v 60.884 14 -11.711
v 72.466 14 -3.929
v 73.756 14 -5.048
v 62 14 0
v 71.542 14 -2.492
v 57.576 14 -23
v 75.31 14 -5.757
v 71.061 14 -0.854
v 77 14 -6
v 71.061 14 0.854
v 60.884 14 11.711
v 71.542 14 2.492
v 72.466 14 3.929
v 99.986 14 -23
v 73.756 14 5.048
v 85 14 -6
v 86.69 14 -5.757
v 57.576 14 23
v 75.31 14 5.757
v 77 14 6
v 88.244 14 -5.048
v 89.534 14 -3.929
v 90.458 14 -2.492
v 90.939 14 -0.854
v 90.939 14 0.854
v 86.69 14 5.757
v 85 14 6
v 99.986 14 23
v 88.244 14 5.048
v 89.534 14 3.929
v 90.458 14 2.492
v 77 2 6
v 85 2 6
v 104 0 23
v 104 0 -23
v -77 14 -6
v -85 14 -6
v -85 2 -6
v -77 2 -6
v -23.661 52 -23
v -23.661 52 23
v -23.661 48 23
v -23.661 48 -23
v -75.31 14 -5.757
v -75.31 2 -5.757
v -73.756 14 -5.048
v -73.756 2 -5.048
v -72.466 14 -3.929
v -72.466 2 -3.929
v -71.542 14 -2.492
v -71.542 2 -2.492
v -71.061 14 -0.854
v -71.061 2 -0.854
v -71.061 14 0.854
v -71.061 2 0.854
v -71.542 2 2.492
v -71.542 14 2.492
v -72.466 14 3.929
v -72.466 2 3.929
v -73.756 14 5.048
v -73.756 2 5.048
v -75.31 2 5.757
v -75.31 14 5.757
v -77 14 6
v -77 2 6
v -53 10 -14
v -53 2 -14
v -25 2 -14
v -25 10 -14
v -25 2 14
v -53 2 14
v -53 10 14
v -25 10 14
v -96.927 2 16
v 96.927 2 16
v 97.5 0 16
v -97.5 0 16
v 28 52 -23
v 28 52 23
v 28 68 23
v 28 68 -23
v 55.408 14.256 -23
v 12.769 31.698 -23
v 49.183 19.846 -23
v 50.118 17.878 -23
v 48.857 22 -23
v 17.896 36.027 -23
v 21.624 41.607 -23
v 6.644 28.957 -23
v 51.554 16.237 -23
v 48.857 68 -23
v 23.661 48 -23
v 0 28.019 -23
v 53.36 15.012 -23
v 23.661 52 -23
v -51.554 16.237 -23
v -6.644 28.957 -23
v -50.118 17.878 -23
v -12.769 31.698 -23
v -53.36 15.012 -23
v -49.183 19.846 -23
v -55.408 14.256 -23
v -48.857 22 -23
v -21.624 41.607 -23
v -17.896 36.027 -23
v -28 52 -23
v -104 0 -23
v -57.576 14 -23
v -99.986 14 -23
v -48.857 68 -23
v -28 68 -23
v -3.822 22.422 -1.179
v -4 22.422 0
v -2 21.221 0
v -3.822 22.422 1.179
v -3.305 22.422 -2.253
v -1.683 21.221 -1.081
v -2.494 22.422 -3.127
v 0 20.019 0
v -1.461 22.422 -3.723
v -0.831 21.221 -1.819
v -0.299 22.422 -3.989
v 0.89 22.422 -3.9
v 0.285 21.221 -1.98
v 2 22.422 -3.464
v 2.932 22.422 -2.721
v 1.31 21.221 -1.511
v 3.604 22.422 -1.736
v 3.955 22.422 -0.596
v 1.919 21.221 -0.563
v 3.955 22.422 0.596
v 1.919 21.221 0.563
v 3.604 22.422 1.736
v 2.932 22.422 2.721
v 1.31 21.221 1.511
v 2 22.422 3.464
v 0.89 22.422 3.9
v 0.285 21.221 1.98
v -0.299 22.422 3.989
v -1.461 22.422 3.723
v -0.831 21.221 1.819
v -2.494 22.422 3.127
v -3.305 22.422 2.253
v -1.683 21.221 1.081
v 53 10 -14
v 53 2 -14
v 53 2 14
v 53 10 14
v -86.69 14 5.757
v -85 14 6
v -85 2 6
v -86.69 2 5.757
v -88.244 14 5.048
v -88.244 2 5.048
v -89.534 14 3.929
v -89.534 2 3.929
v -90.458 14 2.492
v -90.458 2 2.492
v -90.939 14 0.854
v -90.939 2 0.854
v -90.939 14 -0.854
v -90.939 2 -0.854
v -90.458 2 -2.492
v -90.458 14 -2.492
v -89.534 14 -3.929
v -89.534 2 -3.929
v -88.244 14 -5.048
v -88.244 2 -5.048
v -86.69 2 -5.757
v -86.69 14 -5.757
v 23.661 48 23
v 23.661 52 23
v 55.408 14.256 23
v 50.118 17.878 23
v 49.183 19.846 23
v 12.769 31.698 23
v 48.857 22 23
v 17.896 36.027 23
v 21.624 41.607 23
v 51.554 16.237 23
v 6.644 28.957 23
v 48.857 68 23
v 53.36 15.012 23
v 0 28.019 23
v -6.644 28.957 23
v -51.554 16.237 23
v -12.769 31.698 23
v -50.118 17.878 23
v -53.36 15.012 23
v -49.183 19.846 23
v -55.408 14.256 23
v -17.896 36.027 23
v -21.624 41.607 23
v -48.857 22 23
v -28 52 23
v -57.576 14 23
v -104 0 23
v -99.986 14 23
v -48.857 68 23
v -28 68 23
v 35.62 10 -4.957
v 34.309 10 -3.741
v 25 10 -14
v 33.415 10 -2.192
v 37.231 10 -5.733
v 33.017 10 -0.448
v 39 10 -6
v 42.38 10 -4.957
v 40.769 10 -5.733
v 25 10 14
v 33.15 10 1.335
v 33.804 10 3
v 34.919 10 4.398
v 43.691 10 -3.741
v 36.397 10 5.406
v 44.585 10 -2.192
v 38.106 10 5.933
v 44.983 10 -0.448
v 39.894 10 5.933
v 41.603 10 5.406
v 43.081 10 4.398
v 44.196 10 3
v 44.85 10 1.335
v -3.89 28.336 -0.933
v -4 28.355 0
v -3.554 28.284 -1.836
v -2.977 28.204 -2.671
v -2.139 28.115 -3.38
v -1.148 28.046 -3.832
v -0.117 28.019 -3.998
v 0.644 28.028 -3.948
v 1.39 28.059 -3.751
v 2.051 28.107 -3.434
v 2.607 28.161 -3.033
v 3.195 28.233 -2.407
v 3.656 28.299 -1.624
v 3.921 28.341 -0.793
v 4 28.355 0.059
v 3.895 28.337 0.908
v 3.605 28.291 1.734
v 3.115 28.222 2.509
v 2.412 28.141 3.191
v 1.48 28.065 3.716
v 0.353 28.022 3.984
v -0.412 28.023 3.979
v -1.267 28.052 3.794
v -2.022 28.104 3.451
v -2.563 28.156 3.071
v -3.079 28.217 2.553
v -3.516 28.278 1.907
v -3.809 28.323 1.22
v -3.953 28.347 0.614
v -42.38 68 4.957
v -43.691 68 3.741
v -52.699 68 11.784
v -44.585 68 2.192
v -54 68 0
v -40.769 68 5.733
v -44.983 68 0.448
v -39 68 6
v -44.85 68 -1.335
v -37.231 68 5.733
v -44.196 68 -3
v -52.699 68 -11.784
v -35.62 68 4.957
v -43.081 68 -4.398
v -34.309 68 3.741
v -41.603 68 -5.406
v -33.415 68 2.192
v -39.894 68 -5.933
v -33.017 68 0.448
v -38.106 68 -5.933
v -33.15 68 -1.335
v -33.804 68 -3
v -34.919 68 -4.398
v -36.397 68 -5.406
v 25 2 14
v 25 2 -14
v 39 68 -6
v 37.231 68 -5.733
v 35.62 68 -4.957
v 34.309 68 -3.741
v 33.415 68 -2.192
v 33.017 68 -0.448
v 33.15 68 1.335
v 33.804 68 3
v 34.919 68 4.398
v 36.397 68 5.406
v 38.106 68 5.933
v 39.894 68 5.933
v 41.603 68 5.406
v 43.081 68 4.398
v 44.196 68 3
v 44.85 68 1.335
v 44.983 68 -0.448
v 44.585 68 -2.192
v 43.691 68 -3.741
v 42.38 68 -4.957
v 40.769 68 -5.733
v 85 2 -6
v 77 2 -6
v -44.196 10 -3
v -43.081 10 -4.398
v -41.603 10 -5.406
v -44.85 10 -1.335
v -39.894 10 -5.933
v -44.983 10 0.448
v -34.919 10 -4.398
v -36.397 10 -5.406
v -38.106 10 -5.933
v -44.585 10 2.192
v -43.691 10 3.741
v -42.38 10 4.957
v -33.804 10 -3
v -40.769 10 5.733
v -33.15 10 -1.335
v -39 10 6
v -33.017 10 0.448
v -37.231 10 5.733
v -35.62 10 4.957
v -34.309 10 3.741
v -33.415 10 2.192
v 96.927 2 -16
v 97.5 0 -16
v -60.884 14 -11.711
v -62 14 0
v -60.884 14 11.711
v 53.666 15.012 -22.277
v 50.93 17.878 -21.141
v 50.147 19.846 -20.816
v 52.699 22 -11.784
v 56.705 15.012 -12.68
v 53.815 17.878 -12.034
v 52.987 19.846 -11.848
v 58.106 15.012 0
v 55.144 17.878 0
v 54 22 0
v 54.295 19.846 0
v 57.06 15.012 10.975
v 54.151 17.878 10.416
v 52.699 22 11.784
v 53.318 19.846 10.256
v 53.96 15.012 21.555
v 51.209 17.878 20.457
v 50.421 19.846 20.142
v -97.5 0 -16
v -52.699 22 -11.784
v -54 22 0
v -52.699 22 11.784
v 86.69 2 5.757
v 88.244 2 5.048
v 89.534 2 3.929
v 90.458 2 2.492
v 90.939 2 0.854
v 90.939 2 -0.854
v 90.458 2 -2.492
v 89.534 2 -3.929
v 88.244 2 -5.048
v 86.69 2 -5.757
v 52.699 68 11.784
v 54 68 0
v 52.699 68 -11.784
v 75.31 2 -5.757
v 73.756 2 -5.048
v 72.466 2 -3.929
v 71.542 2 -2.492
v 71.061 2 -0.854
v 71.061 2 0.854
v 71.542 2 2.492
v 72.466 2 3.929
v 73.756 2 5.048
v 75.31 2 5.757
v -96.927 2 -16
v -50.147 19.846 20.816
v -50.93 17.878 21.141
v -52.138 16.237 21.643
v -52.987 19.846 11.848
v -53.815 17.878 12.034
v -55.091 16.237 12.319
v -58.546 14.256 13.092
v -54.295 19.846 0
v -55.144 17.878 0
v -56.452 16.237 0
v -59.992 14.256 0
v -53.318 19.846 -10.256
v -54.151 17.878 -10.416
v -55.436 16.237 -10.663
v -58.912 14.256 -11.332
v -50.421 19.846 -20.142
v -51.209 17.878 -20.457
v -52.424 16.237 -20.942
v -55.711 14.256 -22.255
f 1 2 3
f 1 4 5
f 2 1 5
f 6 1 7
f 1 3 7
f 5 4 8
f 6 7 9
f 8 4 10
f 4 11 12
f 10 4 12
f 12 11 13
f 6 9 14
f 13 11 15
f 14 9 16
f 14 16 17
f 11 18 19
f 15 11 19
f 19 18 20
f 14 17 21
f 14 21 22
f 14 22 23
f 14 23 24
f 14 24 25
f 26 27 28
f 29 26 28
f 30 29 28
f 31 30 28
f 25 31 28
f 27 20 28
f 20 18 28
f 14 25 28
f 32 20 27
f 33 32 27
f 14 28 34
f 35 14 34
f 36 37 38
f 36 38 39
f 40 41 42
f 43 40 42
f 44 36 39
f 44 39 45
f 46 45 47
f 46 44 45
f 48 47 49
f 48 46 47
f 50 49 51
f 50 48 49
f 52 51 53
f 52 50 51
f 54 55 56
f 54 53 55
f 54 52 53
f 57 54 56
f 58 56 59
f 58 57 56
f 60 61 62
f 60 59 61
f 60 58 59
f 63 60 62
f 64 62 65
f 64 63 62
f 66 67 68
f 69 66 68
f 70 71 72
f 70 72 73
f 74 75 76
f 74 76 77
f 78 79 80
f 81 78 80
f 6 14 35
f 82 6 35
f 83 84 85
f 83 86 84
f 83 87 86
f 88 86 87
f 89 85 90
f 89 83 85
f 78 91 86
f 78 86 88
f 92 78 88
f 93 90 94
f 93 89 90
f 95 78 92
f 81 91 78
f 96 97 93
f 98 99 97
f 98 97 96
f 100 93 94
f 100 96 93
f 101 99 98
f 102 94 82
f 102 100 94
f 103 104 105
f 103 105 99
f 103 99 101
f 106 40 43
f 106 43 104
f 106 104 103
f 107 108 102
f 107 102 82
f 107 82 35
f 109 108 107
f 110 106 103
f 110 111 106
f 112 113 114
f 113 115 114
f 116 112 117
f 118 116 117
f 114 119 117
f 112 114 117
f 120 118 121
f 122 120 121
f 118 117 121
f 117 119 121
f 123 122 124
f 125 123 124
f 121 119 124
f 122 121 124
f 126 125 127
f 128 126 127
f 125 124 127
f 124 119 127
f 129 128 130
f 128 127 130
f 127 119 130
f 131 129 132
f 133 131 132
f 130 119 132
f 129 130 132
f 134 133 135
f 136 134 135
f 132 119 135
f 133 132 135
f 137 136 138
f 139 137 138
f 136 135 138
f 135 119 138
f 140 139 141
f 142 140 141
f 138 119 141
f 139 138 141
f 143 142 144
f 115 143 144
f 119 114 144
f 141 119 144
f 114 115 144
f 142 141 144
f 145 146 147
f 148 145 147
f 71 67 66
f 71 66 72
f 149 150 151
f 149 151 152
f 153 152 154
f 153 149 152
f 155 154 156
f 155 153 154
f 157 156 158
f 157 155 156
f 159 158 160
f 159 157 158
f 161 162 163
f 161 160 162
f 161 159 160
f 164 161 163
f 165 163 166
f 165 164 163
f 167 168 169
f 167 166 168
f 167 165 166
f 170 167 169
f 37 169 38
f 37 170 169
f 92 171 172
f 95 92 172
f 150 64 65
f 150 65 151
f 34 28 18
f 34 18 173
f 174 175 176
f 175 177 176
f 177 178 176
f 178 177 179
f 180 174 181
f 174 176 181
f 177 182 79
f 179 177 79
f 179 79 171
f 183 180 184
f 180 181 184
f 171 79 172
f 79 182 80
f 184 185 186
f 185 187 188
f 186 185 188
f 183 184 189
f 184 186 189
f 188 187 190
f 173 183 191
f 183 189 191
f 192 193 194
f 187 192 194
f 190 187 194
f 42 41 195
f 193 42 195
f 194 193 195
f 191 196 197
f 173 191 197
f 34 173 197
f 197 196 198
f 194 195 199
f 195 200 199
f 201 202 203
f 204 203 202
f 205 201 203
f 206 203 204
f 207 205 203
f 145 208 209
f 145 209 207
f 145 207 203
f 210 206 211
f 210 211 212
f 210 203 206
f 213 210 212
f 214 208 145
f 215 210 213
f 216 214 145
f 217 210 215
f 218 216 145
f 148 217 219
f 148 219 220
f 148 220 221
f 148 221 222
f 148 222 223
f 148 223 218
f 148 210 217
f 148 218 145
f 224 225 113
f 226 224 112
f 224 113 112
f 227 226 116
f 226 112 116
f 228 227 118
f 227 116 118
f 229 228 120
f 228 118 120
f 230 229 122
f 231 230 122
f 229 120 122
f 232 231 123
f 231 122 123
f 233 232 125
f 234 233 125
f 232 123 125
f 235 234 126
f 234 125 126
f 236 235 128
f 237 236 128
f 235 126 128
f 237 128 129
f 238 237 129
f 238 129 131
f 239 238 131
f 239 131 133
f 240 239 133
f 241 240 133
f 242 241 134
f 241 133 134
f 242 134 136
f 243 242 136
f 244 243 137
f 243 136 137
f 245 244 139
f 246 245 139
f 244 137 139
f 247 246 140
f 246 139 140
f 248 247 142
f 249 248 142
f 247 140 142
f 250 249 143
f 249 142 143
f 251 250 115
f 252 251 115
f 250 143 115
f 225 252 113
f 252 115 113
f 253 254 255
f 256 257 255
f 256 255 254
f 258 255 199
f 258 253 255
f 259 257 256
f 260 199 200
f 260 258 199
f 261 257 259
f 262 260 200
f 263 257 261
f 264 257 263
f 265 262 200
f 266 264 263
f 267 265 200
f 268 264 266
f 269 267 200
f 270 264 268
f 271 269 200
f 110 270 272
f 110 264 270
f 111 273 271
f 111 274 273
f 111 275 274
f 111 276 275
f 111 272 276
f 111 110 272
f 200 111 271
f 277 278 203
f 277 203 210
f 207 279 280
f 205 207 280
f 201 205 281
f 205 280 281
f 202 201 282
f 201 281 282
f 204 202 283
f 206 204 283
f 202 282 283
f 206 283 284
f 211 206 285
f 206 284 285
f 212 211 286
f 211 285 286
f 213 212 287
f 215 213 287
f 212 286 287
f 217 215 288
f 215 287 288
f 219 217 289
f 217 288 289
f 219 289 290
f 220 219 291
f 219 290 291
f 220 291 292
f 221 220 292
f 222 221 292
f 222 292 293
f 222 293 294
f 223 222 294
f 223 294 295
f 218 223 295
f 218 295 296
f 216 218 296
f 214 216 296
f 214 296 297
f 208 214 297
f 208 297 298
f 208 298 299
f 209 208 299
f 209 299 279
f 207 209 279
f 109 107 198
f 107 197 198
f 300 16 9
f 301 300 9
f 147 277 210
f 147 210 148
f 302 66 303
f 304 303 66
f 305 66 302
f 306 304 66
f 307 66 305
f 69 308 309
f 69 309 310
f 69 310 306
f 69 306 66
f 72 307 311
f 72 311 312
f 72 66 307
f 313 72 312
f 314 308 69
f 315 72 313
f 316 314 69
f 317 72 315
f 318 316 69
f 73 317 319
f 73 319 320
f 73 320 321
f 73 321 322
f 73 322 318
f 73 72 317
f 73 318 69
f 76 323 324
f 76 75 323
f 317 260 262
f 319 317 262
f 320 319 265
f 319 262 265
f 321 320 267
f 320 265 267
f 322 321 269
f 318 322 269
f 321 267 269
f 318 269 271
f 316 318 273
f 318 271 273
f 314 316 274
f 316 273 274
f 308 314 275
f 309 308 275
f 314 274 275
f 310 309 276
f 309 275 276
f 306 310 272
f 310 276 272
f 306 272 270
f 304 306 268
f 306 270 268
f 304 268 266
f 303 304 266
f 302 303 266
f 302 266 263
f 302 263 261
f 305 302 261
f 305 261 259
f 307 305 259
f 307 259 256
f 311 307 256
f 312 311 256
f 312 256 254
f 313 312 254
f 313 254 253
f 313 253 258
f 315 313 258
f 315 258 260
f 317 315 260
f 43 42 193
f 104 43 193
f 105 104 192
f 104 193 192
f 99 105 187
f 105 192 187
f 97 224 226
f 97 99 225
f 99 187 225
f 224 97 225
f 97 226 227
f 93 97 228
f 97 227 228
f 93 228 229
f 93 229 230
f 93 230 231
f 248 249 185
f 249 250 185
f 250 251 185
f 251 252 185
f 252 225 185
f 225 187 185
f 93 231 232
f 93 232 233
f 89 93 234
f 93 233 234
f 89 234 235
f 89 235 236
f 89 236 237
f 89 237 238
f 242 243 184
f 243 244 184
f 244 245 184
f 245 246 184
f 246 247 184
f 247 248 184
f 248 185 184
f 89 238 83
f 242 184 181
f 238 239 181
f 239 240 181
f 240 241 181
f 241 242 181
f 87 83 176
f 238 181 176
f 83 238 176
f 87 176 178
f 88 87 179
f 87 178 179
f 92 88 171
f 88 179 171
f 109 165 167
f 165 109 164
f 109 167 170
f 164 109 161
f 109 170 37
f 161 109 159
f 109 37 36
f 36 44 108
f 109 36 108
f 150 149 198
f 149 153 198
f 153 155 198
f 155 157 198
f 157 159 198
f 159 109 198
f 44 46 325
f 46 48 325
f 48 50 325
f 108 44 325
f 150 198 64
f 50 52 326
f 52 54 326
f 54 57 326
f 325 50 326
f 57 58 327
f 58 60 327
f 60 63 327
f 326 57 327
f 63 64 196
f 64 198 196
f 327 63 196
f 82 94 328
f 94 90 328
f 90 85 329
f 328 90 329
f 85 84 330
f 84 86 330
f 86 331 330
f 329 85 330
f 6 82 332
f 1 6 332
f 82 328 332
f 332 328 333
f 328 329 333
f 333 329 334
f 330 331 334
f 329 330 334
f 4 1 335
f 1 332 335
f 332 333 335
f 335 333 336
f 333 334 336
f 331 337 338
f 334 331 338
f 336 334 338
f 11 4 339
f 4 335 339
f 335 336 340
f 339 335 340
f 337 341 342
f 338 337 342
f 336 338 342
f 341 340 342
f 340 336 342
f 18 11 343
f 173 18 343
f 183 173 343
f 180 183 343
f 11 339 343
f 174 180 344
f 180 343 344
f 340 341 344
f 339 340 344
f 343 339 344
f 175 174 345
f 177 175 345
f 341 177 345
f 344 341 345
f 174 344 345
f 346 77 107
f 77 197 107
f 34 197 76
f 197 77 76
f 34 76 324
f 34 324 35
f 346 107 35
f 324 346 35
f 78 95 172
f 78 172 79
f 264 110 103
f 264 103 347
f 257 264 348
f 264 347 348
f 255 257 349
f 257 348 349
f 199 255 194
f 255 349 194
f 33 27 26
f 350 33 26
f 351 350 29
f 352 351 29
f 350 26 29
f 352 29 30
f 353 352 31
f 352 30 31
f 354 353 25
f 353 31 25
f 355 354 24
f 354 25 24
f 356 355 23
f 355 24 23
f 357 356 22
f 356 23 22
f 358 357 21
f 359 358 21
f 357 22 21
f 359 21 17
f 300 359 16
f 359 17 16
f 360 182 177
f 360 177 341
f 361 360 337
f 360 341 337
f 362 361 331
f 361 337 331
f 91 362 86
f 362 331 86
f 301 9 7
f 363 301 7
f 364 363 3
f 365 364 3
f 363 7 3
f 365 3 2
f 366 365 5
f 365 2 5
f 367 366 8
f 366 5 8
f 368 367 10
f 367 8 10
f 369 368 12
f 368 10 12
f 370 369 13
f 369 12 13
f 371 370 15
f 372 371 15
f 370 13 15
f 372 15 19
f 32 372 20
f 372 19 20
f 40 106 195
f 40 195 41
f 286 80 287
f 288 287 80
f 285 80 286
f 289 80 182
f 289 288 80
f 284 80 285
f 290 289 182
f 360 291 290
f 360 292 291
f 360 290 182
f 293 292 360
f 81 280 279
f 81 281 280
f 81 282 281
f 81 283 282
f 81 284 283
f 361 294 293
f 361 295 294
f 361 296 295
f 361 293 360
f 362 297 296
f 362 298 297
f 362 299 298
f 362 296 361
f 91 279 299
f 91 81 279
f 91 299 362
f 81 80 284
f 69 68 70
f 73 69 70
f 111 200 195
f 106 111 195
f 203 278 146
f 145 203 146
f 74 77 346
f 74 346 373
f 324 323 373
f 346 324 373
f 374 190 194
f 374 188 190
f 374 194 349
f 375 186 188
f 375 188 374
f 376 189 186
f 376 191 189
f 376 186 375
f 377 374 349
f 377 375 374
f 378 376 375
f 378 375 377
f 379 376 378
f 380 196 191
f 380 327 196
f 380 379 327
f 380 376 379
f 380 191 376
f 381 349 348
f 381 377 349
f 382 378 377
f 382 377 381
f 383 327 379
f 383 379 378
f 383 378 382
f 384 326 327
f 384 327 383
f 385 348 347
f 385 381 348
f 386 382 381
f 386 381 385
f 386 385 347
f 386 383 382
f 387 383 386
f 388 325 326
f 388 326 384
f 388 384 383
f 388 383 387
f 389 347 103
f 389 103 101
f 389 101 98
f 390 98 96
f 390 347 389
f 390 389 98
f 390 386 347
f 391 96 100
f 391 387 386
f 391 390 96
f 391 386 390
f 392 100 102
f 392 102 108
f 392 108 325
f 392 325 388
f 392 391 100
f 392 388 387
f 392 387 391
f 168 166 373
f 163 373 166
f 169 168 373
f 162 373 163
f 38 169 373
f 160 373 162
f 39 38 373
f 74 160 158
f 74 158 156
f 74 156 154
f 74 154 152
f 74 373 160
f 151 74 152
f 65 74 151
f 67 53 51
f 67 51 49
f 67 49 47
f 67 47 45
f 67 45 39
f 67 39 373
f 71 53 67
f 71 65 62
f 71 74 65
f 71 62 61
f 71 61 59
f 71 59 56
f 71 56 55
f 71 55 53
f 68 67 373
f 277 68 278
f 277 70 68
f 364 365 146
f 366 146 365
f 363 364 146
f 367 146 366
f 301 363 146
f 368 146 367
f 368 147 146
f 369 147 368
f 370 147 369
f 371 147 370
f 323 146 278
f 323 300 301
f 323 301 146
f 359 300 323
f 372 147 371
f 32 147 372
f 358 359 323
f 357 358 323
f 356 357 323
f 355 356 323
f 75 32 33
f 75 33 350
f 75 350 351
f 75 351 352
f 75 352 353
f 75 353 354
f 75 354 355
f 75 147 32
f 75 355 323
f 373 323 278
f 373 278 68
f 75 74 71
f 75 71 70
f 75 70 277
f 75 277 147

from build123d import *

# Parameters (mm, degrees)
BOSS_EXTRUDE1_DEPTH = 23
BOSS_EXTRUDE2_START = -14
BOSS_EXTRUDE2_DEPTH = 68
CUT_EXTRUDE1_DEPTH  = 34
SKETCH4_R           = 6
CUT_EXTRUDE2_DEPTH  = 127.368508735
SKETCH5_W           = 28
SKETCH5_H           = 28
CUT_EXTRUDE3_DEPTH  = 10
CUT_EXTRUDE4_DEPTH  = 16
CUT_EXTRUDE5_DEPTH  = 120.419428905
FILLET1_R           = 8


with BuildPart() as part:
    # Sketch1 → Boss-Extrude1 (new, symmetric)
    with BuildSketch(Plane.XY):
        Polygon((104, 0), (-104, 0), (-99.985564599, 14), (99.985564599, 14), align=None)
    extrude(amount=BOSS_EXTRUDE1_DEPTH, both=True)

    # Sketch2 → Boss-Extrude2 (add)
    with BuildSketch(Plane(origin=(0, 14, 0), x_dir=(1, 0, 0), z_dir=(0, 1, 0)).offset(BOSS_EXTRUDE2_START)):
        with BuildLine():
            Line((48.856934001, 23), (-48.856934001, 23))
            ThreePointArc((-48.856934001, 23), (-54, 0), (-48.856934001, -23))
            Line((-48.856934001, -23), (48.856934001, -23))
            ThreePointArc((48.856934001, -23), (54, 0), (48.856934001, 23))
        make_face()
    extrude(amount=BOSS_EXTRUDE2_DEPTH)

    # Sketch3 → Cut-Extrude1 (cut, symmetric)
    with BuildSketch(Plane.XY):
        with BuildLine():
            Line((-28, 68), (-28, 52))
            Line((-28, 52), (-23.661097096, 52))
            Line((-23.661097096, 52), (-23.661097096, 48))
            ThreePointArc((-23.661097096, 48), (0, 28.019015328), (23.661097096, 48))
            Line((23.661097096, 48), (23.661097096, 52))
            Line((23.661097096, 52), (28, 52))
            Line((28, 52), (28, 68))
            Line((28, 68), (-28, 68))
        make_face()
    extrude(amount=CUT_EXTRUDE1_DEPTH, both=True, mode=Mode.SUBTRACT)

    # Sketch4 → Cut-Extrude2 (cut, through all)
    with BuildSketch(Plane(origin=(0, 68, 0), x_dir=(1, 0, 0), z_dir=(0, 1, 0))):
        with Locations(Location((-39, 0, 0), (0, 0, 270))):
            Circle(SKETCH4_R)
        with Locations(Location((39, 0, 0), (0, 0, 90))):
            Circle(SKETCH4_R)
    extrude(amount=-CUT_EXTRUDE2_DEPTH, mode=Mode.SUBTRACT)

    # Sketch5 → Cut-Extrude3 (cut)
    with BuildSketch(Plane.XZ):
        with Locations((-39, 0)):
            Rectangle(SKETCH5_W, SKETCH5_H)
        with Locations((39, 0)):
            Rectangle(SKETCH5_W, SKETCH5_H)
    extrude(amount=-CUT_EXTRUDE3_DEPTH, mode=Mode.SUBTRACT)

    # Sketch6 → Cut-Extrude4 (cut, symmetric)
    with BuildSketch(Plane.XY):
        Polygon((-97.5, 0), (-96.926509228, 2), (96.926509228, 2), (97.5, 0), align=None)
    extrude(amount=CUT_EXTRUDE4_DEPTH, both=True, mode=Mode.SUBTRACT)

    # Sketch7 → Cut-Extrude5 (cut, through all)
    with BuildSketch(Plane(origin=(0, 14, 0), x_dir=(1, 0, 0), z_dir=(0, 1, 0))):
        with BuildLine():
            Line((-85, 6), (-77, 6))
            ThreePointArc((-77, 6), (-71, 0), (-77, -6))
            Line((-77, -6), (-85, -6))
            ThreePointArc((-85, -6), (-91, 0), (-85, 6))
        make_face()
        with BuildLine():
            Line((85, 6), (77, 6))
            ThreePointArc((77, 6), (71, 0), (77, -6))
            Line((77, -6), (85, -6))
            ThreePointArc((85, -6), (91, 0), (85, 6))
        make_face()
    extrude(amount=-CUT_EXTRUDE5_DEPTH, mode=Mode.SUBTRACT)

    # Sketch8 → Cut-Revolve1 (revolve, cut)
    with BuildSketch(Plane.XY, mode=Mode.PRIVATE) as cut_revolve1_sk:
        Polygon((4, 22.422457805), (0, 20.019015328), (0, 28.019015328), (0, 30.422457805), (4, 30.422457805), align=None)
    revolve(cut_revolve1_sk.sketch.rotate(Axis((0, 28.019015328, 0), (0, -1, 0)), 180), axis=Axis((0, 28.019015328, 0), (0, -1, 0)), mode=Mode.SUBTRACT)

    # Fillet1
    fillet1_edges = [part.edges().sort_by_distance(p)[0] for p in [
        (54, 14, 0),
        (-54, 14, 0),
    ]]
    fillet(fillet1_edges, radius=FILLET1_R)


solid = part.part
